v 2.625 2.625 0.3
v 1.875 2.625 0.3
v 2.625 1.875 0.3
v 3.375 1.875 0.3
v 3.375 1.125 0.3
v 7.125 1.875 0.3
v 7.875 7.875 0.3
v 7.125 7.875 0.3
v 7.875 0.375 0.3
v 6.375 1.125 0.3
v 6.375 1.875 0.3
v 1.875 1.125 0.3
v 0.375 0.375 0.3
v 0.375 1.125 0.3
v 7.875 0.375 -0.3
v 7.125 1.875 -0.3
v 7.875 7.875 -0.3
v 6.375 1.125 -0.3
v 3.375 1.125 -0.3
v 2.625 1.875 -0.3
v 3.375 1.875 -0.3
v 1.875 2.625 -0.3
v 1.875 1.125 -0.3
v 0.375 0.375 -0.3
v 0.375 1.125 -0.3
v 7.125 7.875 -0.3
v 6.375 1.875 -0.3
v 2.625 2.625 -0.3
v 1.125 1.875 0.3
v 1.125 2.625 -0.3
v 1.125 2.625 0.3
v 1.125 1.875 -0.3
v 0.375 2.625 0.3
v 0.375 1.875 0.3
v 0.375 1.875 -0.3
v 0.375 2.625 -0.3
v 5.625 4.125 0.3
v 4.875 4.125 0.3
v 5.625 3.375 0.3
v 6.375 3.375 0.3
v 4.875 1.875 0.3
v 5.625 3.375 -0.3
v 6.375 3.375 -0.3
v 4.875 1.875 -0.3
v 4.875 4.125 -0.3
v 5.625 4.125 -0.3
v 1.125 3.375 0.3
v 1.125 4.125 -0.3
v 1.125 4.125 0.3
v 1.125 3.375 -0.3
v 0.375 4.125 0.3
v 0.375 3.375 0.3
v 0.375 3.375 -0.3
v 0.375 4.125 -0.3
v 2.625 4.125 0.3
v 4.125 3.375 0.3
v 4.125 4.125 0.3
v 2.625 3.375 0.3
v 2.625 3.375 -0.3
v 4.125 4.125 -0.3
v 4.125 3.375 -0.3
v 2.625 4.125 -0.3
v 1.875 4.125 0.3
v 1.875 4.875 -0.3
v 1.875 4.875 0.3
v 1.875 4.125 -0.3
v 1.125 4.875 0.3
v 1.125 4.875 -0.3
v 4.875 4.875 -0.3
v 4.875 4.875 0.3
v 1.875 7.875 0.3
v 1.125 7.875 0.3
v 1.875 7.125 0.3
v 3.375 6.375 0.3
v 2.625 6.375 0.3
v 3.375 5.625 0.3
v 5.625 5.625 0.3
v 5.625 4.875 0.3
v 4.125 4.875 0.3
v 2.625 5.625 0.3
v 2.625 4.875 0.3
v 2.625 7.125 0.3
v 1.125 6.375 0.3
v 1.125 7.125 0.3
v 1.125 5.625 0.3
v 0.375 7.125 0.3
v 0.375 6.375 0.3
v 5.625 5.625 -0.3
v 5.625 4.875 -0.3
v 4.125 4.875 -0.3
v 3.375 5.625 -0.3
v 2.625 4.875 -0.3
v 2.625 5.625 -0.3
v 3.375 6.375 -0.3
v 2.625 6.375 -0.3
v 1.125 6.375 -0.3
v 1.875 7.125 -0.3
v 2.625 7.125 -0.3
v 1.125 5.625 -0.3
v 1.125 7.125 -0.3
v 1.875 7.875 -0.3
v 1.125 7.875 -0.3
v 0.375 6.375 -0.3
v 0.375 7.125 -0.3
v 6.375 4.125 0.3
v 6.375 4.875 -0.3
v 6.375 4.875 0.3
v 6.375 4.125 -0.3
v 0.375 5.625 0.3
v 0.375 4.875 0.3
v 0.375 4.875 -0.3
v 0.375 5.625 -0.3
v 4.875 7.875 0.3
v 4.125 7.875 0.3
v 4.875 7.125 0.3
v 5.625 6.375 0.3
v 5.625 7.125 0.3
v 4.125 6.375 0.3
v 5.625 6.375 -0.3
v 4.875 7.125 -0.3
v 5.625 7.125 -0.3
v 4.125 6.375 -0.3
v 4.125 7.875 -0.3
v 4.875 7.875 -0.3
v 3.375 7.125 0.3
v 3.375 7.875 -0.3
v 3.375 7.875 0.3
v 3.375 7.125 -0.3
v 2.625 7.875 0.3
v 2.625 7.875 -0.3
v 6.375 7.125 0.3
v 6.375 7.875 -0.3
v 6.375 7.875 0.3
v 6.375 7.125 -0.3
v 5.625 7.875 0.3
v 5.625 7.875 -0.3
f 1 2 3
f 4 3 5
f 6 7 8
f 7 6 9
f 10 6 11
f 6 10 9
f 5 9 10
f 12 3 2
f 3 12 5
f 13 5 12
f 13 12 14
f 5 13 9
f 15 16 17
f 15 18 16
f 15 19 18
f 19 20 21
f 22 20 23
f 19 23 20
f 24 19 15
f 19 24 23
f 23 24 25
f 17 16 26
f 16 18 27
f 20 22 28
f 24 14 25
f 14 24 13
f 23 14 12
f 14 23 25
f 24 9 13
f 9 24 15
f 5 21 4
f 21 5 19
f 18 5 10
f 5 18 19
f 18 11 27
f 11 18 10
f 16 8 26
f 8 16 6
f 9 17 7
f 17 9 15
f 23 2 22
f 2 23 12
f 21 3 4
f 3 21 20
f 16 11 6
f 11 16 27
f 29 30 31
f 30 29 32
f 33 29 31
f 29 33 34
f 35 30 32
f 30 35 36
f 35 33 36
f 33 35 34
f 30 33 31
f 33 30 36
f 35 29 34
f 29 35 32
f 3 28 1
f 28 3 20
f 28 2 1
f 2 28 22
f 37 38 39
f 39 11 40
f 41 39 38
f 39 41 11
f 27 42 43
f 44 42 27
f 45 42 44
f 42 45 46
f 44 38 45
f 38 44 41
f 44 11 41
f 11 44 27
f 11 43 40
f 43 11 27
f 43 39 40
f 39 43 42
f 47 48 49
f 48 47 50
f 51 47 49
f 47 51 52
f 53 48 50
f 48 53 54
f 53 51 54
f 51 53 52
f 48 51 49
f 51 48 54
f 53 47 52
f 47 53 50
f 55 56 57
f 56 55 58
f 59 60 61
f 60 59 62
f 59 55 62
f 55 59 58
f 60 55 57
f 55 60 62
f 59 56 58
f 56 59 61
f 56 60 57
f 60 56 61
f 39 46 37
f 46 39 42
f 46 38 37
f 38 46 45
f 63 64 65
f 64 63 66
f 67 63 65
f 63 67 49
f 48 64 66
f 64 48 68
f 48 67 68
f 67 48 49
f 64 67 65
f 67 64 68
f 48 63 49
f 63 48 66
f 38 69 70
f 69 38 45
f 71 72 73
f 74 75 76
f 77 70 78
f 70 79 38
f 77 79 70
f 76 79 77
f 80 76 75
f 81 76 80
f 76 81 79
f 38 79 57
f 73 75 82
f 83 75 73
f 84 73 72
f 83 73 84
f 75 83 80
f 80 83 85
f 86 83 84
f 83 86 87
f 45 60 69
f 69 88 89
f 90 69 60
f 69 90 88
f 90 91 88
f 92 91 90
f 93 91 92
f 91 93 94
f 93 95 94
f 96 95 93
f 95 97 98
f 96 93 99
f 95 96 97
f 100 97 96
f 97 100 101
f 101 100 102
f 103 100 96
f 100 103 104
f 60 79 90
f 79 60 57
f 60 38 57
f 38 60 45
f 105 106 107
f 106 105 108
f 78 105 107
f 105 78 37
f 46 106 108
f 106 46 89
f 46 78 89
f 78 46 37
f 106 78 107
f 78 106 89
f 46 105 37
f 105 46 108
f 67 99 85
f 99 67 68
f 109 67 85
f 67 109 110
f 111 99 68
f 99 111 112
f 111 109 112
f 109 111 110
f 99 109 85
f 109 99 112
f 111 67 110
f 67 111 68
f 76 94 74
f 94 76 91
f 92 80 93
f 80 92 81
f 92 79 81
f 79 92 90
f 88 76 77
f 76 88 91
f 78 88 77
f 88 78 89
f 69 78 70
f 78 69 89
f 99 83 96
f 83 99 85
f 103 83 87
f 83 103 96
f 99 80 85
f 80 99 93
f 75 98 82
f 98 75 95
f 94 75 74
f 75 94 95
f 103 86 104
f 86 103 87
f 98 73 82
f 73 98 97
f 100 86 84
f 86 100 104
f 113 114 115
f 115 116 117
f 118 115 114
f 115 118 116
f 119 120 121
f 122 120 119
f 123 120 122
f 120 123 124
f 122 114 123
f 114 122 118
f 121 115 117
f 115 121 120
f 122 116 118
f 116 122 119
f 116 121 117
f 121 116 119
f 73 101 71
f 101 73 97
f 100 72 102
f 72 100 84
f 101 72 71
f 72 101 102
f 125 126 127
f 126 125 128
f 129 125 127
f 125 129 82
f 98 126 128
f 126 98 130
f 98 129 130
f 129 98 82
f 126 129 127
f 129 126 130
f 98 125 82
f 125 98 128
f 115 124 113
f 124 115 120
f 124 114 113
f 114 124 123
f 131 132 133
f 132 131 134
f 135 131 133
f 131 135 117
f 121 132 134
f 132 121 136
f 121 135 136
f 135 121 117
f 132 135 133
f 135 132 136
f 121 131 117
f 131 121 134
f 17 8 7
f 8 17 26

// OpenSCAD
rotate([0,0,0])translate([0,0,0,]){
translate([0.75,0.75,0])  cube(size = [0.75,0.75,0.6], center=true);
translate([1.5,0.75,0])  cube(size = [0.75,0.75,0.6], center=true);
translate([2.25,0.75,0])  cube(size = [0.75,0.75,0.6], center=true);
translate([3,0.75,0])  cube(size = [0.75,0.75,0.6], center=true);
translate([3.75,0.75,0])  cube(size = [0.75,0.75,0.6], center=true);
translate([4.5,0.75,0])  cube(size = [0.75,0.75,0.6], center=true);
translate([5.25,0.75,0])  cube(size = [0.75,0.75,0.6], center=true);
translate([6,0.75,0])  cube(size = [0.75,0.75,0.6], center=true);
translate([6.75,0.75,0])  cube(size = [0.75,0.75,0.6], center=true);
translate([7.5,0.75,0])  cube(size = [0.75,0.75,0.6], center=true);
translate([7.5,0.75,0])  cube(size = [0.75,0.75,0.6], center=true);
translate([7.5,0.75,0])  cube(size = [0.75,0.75,0.6], center=true);
translate([2.25,1.5,0])  cube(size = [0.75,0.75,0.6], center=true);
translate([3,1.5,0])  cube(size = [0.75,0.75,0.6], center=true);
translate([3,1.5,0])  cube(size = [0.75,0.75,0.6], center=true);
translate([3,1.5,0])  cube(size = [0.75,0.75,0.6], center=true);
translate([3,1.5,0])  cube(size = [0.75,0.75,0.6], center=true);
translate([3,1.5,0])  cube(size = [0.75,0.75,0.6], center=true);
translate([6.75,1.5,0])  cube(size = [0.75,0.75,0.6], center=true);
translate([7.5,1.5,0])  cube(size = [0.75,0.75,0.6], center=true);
translate([0.75,2.25,0])  cube(size = [0.75,0.75,0.6], center=true);
translate([0.75,2.25,0])  cube(size = [0.75,0.75,0.6], center=true);
translate([2.25,2.25,0])  cube(size = [0.75,0.75,0.6], center=true);
translate([2.25,2.25,0])  cube(size = [0.75,0.75,0.6], center=true);
translate([2.25,2.25,0])  cube(size = [0.75,0.75,0.6], center=true);
translate([2.25,2.25,0])  cube(size = [0.75,0.75,0.6], center=true);
translate([5.25,2.25,0])  cube(size = [0.75,0.75,0.6], center=true);
translate([6,2.25,0])  cube(size = [0.75,0.75,0.6], center=true);
translate([6,2.25,0])  cube(size = [0.75,0.75,0.6], center=true);
translate([7.5,2.25,0])  cube(size = [0.75,0.75,0.6], center=true);
translate([7.5,2.25,0])  cube(size = [0.75,0.75,0.6], center=true);
translate([7.5,2.25,0])  cube(size = [0.75,0.75,0.6], center=true);
translate([7.5,2.25,0])  cube(size = [0.75,0.75,0.6], center=true);
translate([7.5,2.25,0])  cube(size = [0.75,0.75,0.6], center=true);
translate([7.5,2.25,0])  cube(size = [0.75,0.75,0.6], center=true);
translate([7.5,2.25,0])  cube(size = [0.75,0.75,0.6], center=true);
translate([5.25,3,0])  cube(size = [0.75,0.75,0.6], center=true);
translate([6,3,0])  cube(size = [0.75,0.75,0.6], center=true);
translate([6,3,0])  cube(size = [0.75,0.75,0.6], center=true);
translate([7.5,3,0])  cube(size = [0.75,0.75,0.6], center=true);
translate([0.75,3.75,0])  cube(size = [0.75,0.75,0.6], center=true);
translate([0.75,3.75,0])  cube(size = [0.75,0.75,0.6], center=true);
translate([0.75,3.75,0])  cube(size = [0.75,0.75,0.6], center=true);
translate([3,3.75,0])  cube(size = [0.75,0.75,0.6], center=true);
translate([3.75,3.75,0])  cube(size = [0.75,0.75,0.6], center=true);
translate([3.75,3.75,0])  cube(size = [0.75,0.75,0.6], center=true);
translate([5.25,3.75,0])  cube(size = [0.75,0.75,0.6], center=true);
translate([5.25,3.75,0])  cube(size = [0.75,0.75,0.6], center=true);
translate([5.25,3.75,0])  cube(size = [0.75,0.75,0.6], center=true);
translate([7.5,3.75,0])  cube(size = [0.75,0.75,0.6], center=true);
translate([7.5,3.75,0])  cube(size = [0.75,0.75,0.6], center=true);
translate([1.5,4.5,0])  cube(size = [0.75,0.75,0.6], center=true);
translate([1.5,4.5,0])  cube(size = [0.75,0.75,0.6], center=true);
translate([1.5,4.5,0])  cube(size = [0.75,0.75,0.6], center=true);
translate([1.5,4.5,0])  cube(size = [0.75,0.75,0.6], center=true);
translate([4.5,4.5,0])  cube(size = [0.75,0.75,0.6], center=true);
translate([4.5,4.5,0])  cube(size = [0.75,0.75,0.6], center=true);
translate([6,4.5,0])  cube(size = [0.75,0.75,0.6], center=true);
translate([6,4.5,0])  cube(size = [0.75,0.75,0.6], center=true);
translate([7.5,4.5,0])  cube(size = [0.75,0.75,0.6], center=true);
translate([0.75,5.25,0])  cube(size = [0.75,0.75,0.6], center=true);
translate([0.75,5.25,0])  cube(size = [0.75,0.75,0.6], center=true);
translate([0.75,5.25,0])  cube(size = [0.75,0.75,0.6], center=true);
translate([3,5.25,0])  cube(size = [0.75,0.75,0.6], center=true);
translate([3.75,5.25,0])  cube(size = [0.75,0.75,0.6], center=true);
translate([4.5,5.25,0])  cube(size = [0.75,0.75,0.6], center=true);
translate([5.25,5.25,0])  cube(size = [0.75,0.75,0.6], center=true);
translate([5.25,5.25,0])  cube(size = [0.75,0.75,0.6], center=true);
translate([5.25,5.25,0])  cube(size = [0.75,0.75,0.6], center=true);
translate([7.5,5.25,0])  cube(size = [0.75,0.75,0.6], center=true);
translate([7.5,5.25,0])  cube(size = [0.75,0.75,0.6], center=true);
translate([1.5,6,0])  cube(size = [0.75,0.75,0.6], center=true);
translate([2.25,6,0])  cube(size = [0.75,0.75,0.6], center=true);
translate([3,6,0])  cube(size = [0.75,0.75,0.6], center=true);
translate([3,6,0])  cube(size = [0.75,0.75,0.6], center=true);
translate([3,6,0])  cube(size = [0.75,0.75,0.6], center=true);
translate([3,6,0])  cube(size = [0.75,0.75,0.6], center=true);
translate([3,6,0])  cube(size = [0.75,0.75,0.6], center=true);
translate([3,6,0])  cube(size = [0.75,0.75,0.6], center=true);
translate([7.5,6,0])  cube(size = [0.75,0.75,0.6], center=true);
translate([0.75,6.75,0])  cube(size = [0.75,0.75,0.6], center=true);
translate([1.5,6.75,0])  cube(size = [0.75,0.75,0.6], center=true);
translate([2.25,6.75,0])  cube(size = [0.75,0.75,0.6], center=true);
translate([2.25,6.75,0])  cube(size = [0.75,0.75,0.6], center=true);
translate([2.25,6.75,0])  cube(size = [0.75,0.75,0.6], center=true);
translate([4.5,6.75,0])  cube(size = [0.75,0.75,0.6], center=true);
translate([5.25,6.75,0])  cube(size = [0.75,0.75,0.6], center=true);
translate([5.25,6.75,0])  cube(size = [0.75,0.75,0.6], center=true);
translate([5.25,6.75,0])  cube(size = [0.75,0.75,0.6], center=true);
translate([7.5,6.75,0])  cube(size = [0.75,0.75,0.6], center=true);
translate([7.5,6.75,0])  cube(size = [0.75,0.75,0.6], center=true);
translate([1.5,7.5,0])  cube(size = [0.75,0.75,0.6], center=true);
translate([1.5,7.5,0])  cube(size = [0.75,0.75,0.6], center=true);
translate([3,7.5,0])  cube(size = [0.75,0.75,0.6], center=true);
translate([3,7.5,0])  cube(size = [0.75,0.75,0.6], center=true);
translate([4.5,7.5,0])  cube(size = [0.75,0.75,0.6], center=true);
translate([4.5,7.5,0])  cube(size = [0.75,0.75,0.6], center=true);
translate([6,7.5,0])  cube(size = [0.75,0.75,0.6], center=true);
translate([6,7.5,0])  cube(size = [0.75,0.75,0.6], center=true);
translate([7.5,7.5,0])  cube(size = [0.75,0.75,0.6], center=true);
}
